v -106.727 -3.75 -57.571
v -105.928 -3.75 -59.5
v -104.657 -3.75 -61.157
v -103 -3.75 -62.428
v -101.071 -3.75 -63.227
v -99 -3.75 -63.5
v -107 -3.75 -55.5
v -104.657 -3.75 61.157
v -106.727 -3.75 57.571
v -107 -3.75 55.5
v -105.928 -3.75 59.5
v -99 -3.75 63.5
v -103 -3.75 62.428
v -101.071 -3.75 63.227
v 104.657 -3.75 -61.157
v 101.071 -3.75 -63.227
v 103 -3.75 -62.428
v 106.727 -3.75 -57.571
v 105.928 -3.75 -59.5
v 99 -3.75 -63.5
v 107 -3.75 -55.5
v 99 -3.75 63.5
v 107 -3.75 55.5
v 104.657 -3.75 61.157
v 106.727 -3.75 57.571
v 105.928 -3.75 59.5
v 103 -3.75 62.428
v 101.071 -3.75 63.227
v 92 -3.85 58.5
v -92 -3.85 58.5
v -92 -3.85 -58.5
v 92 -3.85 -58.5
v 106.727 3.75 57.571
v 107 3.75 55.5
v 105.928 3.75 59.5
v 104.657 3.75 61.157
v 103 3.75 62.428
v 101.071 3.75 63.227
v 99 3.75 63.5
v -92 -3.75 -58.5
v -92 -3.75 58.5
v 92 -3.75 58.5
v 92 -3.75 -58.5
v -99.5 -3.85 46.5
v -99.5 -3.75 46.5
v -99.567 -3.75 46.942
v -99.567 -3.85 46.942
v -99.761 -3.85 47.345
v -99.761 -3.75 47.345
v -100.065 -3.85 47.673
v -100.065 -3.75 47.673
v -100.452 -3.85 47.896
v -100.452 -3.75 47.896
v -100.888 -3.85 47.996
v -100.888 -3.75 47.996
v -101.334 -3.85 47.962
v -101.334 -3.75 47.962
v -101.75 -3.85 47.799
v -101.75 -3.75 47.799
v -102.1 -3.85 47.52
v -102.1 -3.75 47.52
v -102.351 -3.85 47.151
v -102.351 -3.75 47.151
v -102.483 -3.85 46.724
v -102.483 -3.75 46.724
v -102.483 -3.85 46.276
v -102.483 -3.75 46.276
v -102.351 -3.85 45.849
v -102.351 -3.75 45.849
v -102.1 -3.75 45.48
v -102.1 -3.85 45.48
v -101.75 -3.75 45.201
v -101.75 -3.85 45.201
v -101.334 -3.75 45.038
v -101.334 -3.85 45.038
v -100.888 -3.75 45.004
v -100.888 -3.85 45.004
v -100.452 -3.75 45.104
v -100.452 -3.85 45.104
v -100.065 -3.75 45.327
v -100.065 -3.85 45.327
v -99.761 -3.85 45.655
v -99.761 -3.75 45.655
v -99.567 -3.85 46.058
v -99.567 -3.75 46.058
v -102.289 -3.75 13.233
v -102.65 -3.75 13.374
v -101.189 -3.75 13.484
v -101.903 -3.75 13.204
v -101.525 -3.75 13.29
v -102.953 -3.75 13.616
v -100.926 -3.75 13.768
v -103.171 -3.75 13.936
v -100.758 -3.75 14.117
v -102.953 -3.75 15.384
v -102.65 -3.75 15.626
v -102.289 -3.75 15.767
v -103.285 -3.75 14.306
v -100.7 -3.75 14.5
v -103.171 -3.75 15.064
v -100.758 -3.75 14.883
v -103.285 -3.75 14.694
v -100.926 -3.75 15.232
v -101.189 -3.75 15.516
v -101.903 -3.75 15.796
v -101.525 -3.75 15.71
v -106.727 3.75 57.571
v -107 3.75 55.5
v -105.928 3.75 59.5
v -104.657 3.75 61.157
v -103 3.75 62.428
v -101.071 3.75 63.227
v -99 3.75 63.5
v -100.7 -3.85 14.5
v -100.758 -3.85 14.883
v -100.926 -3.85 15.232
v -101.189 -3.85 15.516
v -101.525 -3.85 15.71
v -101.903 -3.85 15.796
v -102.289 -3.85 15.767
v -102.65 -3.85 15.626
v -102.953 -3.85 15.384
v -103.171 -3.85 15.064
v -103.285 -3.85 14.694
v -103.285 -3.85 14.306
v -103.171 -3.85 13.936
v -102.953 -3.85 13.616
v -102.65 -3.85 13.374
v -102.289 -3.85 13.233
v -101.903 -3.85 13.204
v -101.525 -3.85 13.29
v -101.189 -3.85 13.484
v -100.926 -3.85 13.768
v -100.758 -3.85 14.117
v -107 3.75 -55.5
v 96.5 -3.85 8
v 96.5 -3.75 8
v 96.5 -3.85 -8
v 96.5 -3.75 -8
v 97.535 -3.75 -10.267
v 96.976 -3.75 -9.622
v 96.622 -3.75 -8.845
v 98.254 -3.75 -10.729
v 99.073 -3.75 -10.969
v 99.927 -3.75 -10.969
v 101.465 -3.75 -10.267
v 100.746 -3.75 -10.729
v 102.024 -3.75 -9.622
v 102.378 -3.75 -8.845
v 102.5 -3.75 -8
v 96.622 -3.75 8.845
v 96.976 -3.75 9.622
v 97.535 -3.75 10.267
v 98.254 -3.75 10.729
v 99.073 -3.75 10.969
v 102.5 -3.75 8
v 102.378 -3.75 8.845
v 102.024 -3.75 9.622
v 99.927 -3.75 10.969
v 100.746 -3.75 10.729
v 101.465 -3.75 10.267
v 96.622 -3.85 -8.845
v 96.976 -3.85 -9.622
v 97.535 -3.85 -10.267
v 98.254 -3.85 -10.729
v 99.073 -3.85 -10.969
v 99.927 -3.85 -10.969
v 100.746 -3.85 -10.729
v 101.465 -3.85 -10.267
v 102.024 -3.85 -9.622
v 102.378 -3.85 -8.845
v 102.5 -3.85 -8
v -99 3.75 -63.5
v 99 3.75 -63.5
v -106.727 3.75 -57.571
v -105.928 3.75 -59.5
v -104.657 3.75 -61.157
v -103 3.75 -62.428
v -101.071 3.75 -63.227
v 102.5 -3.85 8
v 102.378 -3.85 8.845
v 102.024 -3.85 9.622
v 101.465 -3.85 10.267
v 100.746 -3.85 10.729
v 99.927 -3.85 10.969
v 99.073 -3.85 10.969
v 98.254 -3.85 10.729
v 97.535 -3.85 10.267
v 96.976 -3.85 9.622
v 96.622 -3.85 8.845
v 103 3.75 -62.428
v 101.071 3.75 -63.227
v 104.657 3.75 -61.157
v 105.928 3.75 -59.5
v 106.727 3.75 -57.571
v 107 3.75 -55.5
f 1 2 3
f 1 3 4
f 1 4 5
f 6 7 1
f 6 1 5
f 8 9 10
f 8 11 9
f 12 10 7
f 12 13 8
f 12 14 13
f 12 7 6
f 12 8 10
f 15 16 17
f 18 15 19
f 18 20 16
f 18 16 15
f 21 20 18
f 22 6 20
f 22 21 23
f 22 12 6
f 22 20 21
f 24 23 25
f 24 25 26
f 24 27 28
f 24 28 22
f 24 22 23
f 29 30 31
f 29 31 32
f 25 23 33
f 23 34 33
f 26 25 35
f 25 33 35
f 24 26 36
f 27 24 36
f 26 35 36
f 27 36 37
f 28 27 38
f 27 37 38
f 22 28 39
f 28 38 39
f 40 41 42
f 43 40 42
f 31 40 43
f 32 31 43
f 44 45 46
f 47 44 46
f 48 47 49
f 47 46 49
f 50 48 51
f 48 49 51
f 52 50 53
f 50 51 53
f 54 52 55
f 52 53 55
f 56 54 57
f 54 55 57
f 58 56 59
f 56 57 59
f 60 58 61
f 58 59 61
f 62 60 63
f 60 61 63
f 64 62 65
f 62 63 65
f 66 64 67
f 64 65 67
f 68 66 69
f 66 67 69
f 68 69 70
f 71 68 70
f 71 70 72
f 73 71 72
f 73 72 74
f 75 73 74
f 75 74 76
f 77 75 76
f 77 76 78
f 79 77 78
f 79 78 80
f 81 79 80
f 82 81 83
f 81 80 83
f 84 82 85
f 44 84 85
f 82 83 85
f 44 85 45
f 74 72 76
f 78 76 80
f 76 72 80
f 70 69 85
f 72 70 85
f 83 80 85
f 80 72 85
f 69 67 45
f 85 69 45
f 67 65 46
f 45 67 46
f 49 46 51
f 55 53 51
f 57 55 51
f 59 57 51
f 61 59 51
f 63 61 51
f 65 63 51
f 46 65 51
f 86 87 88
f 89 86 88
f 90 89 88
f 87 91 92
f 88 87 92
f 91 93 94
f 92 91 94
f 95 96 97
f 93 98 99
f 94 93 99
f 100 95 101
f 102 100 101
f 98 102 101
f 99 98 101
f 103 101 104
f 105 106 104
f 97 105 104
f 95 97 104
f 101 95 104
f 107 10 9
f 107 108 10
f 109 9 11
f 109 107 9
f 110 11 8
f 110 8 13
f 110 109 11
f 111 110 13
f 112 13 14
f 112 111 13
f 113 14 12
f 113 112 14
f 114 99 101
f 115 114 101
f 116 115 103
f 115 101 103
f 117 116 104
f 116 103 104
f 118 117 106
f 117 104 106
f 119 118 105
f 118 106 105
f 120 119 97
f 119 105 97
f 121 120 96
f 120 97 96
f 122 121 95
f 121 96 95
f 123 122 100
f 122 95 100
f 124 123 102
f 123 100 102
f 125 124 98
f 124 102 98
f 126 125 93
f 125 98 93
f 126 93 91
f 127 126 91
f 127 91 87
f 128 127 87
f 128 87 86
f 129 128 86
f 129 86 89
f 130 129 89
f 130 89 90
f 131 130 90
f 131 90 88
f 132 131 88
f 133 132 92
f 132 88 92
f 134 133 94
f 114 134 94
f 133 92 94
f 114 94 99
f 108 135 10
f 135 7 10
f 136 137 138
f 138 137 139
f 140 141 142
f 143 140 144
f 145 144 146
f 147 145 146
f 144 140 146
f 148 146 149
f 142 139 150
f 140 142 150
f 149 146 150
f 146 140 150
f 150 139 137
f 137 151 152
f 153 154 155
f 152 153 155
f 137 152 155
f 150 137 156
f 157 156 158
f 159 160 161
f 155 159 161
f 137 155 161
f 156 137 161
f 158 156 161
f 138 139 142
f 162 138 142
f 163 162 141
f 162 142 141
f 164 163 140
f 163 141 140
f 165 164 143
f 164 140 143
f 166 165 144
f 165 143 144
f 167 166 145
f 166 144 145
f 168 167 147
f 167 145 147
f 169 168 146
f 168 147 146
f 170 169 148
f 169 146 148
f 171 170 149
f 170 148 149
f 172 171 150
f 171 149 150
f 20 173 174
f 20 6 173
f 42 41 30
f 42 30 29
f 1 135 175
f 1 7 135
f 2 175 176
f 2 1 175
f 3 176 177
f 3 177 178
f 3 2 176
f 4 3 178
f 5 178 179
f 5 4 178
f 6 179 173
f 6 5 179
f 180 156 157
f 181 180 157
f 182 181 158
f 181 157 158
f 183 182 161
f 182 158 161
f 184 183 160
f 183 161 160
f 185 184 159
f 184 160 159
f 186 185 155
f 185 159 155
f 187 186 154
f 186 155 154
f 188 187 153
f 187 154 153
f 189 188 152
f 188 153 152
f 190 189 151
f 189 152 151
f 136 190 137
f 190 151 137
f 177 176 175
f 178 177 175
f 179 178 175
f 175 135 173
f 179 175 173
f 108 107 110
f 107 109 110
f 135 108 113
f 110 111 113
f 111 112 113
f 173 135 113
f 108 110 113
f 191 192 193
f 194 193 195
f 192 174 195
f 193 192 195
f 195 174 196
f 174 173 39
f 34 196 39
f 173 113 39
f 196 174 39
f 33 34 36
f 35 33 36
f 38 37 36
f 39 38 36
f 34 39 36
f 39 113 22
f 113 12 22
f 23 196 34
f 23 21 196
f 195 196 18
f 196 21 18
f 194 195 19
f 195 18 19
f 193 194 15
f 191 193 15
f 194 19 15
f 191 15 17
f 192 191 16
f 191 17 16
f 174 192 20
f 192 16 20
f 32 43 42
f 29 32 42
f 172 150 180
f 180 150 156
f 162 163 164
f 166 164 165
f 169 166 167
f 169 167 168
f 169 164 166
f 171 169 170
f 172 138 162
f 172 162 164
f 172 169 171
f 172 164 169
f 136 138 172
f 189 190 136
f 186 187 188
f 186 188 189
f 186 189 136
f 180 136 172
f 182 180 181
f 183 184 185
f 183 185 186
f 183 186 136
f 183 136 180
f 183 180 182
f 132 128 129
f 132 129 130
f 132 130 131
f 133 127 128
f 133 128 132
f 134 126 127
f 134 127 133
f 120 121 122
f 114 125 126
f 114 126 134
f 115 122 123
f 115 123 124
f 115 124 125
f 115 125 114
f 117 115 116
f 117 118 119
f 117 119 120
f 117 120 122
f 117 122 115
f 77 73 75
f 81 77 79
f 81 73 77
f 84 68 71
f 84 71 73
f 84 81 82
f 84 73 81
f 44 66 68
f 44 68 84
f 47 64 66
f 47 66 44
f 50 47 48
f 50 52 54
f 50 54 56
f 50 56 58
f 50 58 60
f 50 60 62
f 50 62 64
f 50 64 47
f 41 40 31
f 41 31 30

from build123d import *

# Parameters (mm, degrees)
F0_W     = 214
F0_H     = 127
F1_DEPTH = 3.75
F2_R     = 8
F3_W     = 184
F3_H     = 117
F3_R     = 1.3
F3_R_2   = 1.5
F4_DEPTH = 0.1


with BuildPart() as f1:
    # F0 (on Front) → F1 (new body, symmetric)
    with BuildSketch(Plane.XZ):
        Rectangle(F0_W, F0_H)
    extrude(amount=F1_DEPTH, both=True)

    # F2
    f2_edges = [f1.edges().sort_by_distance(p)[0] for p in [
        (107, 0, 63.5),
        (107, 0, -63.5),
        (-107, 0, 63.5),
        (-107, 0, -63.5),
    ]]
    fillet(f2_edges, radius=F2_R)


with BuildPart() as f4:
    # F3 (on face) → F4 (new body)
    with BuildSketch(Plane.XZ.offset(3.75)):
        with BuildLine():
            ThreePointArc((96.5, -8), (99.5, -11), (102.5, -8))
            Line((102.5, -8), (102.5, 8))
            ThreePointArc((102.5, 8), (99.5, 11), (96.5, 8))
            Line((96.5, 8), (96.5, -8))
        make_face()
        Rectangle(F3_W, F3_H)
        with Locations((-102, 14.5)):
            Circle(F3_R)
        with Locations((-101, 46.5)):
            Circle(F3_R_2)
    extrude(amount=F4_DEPTH)


solid = Compound([f1.part, f4.part])
